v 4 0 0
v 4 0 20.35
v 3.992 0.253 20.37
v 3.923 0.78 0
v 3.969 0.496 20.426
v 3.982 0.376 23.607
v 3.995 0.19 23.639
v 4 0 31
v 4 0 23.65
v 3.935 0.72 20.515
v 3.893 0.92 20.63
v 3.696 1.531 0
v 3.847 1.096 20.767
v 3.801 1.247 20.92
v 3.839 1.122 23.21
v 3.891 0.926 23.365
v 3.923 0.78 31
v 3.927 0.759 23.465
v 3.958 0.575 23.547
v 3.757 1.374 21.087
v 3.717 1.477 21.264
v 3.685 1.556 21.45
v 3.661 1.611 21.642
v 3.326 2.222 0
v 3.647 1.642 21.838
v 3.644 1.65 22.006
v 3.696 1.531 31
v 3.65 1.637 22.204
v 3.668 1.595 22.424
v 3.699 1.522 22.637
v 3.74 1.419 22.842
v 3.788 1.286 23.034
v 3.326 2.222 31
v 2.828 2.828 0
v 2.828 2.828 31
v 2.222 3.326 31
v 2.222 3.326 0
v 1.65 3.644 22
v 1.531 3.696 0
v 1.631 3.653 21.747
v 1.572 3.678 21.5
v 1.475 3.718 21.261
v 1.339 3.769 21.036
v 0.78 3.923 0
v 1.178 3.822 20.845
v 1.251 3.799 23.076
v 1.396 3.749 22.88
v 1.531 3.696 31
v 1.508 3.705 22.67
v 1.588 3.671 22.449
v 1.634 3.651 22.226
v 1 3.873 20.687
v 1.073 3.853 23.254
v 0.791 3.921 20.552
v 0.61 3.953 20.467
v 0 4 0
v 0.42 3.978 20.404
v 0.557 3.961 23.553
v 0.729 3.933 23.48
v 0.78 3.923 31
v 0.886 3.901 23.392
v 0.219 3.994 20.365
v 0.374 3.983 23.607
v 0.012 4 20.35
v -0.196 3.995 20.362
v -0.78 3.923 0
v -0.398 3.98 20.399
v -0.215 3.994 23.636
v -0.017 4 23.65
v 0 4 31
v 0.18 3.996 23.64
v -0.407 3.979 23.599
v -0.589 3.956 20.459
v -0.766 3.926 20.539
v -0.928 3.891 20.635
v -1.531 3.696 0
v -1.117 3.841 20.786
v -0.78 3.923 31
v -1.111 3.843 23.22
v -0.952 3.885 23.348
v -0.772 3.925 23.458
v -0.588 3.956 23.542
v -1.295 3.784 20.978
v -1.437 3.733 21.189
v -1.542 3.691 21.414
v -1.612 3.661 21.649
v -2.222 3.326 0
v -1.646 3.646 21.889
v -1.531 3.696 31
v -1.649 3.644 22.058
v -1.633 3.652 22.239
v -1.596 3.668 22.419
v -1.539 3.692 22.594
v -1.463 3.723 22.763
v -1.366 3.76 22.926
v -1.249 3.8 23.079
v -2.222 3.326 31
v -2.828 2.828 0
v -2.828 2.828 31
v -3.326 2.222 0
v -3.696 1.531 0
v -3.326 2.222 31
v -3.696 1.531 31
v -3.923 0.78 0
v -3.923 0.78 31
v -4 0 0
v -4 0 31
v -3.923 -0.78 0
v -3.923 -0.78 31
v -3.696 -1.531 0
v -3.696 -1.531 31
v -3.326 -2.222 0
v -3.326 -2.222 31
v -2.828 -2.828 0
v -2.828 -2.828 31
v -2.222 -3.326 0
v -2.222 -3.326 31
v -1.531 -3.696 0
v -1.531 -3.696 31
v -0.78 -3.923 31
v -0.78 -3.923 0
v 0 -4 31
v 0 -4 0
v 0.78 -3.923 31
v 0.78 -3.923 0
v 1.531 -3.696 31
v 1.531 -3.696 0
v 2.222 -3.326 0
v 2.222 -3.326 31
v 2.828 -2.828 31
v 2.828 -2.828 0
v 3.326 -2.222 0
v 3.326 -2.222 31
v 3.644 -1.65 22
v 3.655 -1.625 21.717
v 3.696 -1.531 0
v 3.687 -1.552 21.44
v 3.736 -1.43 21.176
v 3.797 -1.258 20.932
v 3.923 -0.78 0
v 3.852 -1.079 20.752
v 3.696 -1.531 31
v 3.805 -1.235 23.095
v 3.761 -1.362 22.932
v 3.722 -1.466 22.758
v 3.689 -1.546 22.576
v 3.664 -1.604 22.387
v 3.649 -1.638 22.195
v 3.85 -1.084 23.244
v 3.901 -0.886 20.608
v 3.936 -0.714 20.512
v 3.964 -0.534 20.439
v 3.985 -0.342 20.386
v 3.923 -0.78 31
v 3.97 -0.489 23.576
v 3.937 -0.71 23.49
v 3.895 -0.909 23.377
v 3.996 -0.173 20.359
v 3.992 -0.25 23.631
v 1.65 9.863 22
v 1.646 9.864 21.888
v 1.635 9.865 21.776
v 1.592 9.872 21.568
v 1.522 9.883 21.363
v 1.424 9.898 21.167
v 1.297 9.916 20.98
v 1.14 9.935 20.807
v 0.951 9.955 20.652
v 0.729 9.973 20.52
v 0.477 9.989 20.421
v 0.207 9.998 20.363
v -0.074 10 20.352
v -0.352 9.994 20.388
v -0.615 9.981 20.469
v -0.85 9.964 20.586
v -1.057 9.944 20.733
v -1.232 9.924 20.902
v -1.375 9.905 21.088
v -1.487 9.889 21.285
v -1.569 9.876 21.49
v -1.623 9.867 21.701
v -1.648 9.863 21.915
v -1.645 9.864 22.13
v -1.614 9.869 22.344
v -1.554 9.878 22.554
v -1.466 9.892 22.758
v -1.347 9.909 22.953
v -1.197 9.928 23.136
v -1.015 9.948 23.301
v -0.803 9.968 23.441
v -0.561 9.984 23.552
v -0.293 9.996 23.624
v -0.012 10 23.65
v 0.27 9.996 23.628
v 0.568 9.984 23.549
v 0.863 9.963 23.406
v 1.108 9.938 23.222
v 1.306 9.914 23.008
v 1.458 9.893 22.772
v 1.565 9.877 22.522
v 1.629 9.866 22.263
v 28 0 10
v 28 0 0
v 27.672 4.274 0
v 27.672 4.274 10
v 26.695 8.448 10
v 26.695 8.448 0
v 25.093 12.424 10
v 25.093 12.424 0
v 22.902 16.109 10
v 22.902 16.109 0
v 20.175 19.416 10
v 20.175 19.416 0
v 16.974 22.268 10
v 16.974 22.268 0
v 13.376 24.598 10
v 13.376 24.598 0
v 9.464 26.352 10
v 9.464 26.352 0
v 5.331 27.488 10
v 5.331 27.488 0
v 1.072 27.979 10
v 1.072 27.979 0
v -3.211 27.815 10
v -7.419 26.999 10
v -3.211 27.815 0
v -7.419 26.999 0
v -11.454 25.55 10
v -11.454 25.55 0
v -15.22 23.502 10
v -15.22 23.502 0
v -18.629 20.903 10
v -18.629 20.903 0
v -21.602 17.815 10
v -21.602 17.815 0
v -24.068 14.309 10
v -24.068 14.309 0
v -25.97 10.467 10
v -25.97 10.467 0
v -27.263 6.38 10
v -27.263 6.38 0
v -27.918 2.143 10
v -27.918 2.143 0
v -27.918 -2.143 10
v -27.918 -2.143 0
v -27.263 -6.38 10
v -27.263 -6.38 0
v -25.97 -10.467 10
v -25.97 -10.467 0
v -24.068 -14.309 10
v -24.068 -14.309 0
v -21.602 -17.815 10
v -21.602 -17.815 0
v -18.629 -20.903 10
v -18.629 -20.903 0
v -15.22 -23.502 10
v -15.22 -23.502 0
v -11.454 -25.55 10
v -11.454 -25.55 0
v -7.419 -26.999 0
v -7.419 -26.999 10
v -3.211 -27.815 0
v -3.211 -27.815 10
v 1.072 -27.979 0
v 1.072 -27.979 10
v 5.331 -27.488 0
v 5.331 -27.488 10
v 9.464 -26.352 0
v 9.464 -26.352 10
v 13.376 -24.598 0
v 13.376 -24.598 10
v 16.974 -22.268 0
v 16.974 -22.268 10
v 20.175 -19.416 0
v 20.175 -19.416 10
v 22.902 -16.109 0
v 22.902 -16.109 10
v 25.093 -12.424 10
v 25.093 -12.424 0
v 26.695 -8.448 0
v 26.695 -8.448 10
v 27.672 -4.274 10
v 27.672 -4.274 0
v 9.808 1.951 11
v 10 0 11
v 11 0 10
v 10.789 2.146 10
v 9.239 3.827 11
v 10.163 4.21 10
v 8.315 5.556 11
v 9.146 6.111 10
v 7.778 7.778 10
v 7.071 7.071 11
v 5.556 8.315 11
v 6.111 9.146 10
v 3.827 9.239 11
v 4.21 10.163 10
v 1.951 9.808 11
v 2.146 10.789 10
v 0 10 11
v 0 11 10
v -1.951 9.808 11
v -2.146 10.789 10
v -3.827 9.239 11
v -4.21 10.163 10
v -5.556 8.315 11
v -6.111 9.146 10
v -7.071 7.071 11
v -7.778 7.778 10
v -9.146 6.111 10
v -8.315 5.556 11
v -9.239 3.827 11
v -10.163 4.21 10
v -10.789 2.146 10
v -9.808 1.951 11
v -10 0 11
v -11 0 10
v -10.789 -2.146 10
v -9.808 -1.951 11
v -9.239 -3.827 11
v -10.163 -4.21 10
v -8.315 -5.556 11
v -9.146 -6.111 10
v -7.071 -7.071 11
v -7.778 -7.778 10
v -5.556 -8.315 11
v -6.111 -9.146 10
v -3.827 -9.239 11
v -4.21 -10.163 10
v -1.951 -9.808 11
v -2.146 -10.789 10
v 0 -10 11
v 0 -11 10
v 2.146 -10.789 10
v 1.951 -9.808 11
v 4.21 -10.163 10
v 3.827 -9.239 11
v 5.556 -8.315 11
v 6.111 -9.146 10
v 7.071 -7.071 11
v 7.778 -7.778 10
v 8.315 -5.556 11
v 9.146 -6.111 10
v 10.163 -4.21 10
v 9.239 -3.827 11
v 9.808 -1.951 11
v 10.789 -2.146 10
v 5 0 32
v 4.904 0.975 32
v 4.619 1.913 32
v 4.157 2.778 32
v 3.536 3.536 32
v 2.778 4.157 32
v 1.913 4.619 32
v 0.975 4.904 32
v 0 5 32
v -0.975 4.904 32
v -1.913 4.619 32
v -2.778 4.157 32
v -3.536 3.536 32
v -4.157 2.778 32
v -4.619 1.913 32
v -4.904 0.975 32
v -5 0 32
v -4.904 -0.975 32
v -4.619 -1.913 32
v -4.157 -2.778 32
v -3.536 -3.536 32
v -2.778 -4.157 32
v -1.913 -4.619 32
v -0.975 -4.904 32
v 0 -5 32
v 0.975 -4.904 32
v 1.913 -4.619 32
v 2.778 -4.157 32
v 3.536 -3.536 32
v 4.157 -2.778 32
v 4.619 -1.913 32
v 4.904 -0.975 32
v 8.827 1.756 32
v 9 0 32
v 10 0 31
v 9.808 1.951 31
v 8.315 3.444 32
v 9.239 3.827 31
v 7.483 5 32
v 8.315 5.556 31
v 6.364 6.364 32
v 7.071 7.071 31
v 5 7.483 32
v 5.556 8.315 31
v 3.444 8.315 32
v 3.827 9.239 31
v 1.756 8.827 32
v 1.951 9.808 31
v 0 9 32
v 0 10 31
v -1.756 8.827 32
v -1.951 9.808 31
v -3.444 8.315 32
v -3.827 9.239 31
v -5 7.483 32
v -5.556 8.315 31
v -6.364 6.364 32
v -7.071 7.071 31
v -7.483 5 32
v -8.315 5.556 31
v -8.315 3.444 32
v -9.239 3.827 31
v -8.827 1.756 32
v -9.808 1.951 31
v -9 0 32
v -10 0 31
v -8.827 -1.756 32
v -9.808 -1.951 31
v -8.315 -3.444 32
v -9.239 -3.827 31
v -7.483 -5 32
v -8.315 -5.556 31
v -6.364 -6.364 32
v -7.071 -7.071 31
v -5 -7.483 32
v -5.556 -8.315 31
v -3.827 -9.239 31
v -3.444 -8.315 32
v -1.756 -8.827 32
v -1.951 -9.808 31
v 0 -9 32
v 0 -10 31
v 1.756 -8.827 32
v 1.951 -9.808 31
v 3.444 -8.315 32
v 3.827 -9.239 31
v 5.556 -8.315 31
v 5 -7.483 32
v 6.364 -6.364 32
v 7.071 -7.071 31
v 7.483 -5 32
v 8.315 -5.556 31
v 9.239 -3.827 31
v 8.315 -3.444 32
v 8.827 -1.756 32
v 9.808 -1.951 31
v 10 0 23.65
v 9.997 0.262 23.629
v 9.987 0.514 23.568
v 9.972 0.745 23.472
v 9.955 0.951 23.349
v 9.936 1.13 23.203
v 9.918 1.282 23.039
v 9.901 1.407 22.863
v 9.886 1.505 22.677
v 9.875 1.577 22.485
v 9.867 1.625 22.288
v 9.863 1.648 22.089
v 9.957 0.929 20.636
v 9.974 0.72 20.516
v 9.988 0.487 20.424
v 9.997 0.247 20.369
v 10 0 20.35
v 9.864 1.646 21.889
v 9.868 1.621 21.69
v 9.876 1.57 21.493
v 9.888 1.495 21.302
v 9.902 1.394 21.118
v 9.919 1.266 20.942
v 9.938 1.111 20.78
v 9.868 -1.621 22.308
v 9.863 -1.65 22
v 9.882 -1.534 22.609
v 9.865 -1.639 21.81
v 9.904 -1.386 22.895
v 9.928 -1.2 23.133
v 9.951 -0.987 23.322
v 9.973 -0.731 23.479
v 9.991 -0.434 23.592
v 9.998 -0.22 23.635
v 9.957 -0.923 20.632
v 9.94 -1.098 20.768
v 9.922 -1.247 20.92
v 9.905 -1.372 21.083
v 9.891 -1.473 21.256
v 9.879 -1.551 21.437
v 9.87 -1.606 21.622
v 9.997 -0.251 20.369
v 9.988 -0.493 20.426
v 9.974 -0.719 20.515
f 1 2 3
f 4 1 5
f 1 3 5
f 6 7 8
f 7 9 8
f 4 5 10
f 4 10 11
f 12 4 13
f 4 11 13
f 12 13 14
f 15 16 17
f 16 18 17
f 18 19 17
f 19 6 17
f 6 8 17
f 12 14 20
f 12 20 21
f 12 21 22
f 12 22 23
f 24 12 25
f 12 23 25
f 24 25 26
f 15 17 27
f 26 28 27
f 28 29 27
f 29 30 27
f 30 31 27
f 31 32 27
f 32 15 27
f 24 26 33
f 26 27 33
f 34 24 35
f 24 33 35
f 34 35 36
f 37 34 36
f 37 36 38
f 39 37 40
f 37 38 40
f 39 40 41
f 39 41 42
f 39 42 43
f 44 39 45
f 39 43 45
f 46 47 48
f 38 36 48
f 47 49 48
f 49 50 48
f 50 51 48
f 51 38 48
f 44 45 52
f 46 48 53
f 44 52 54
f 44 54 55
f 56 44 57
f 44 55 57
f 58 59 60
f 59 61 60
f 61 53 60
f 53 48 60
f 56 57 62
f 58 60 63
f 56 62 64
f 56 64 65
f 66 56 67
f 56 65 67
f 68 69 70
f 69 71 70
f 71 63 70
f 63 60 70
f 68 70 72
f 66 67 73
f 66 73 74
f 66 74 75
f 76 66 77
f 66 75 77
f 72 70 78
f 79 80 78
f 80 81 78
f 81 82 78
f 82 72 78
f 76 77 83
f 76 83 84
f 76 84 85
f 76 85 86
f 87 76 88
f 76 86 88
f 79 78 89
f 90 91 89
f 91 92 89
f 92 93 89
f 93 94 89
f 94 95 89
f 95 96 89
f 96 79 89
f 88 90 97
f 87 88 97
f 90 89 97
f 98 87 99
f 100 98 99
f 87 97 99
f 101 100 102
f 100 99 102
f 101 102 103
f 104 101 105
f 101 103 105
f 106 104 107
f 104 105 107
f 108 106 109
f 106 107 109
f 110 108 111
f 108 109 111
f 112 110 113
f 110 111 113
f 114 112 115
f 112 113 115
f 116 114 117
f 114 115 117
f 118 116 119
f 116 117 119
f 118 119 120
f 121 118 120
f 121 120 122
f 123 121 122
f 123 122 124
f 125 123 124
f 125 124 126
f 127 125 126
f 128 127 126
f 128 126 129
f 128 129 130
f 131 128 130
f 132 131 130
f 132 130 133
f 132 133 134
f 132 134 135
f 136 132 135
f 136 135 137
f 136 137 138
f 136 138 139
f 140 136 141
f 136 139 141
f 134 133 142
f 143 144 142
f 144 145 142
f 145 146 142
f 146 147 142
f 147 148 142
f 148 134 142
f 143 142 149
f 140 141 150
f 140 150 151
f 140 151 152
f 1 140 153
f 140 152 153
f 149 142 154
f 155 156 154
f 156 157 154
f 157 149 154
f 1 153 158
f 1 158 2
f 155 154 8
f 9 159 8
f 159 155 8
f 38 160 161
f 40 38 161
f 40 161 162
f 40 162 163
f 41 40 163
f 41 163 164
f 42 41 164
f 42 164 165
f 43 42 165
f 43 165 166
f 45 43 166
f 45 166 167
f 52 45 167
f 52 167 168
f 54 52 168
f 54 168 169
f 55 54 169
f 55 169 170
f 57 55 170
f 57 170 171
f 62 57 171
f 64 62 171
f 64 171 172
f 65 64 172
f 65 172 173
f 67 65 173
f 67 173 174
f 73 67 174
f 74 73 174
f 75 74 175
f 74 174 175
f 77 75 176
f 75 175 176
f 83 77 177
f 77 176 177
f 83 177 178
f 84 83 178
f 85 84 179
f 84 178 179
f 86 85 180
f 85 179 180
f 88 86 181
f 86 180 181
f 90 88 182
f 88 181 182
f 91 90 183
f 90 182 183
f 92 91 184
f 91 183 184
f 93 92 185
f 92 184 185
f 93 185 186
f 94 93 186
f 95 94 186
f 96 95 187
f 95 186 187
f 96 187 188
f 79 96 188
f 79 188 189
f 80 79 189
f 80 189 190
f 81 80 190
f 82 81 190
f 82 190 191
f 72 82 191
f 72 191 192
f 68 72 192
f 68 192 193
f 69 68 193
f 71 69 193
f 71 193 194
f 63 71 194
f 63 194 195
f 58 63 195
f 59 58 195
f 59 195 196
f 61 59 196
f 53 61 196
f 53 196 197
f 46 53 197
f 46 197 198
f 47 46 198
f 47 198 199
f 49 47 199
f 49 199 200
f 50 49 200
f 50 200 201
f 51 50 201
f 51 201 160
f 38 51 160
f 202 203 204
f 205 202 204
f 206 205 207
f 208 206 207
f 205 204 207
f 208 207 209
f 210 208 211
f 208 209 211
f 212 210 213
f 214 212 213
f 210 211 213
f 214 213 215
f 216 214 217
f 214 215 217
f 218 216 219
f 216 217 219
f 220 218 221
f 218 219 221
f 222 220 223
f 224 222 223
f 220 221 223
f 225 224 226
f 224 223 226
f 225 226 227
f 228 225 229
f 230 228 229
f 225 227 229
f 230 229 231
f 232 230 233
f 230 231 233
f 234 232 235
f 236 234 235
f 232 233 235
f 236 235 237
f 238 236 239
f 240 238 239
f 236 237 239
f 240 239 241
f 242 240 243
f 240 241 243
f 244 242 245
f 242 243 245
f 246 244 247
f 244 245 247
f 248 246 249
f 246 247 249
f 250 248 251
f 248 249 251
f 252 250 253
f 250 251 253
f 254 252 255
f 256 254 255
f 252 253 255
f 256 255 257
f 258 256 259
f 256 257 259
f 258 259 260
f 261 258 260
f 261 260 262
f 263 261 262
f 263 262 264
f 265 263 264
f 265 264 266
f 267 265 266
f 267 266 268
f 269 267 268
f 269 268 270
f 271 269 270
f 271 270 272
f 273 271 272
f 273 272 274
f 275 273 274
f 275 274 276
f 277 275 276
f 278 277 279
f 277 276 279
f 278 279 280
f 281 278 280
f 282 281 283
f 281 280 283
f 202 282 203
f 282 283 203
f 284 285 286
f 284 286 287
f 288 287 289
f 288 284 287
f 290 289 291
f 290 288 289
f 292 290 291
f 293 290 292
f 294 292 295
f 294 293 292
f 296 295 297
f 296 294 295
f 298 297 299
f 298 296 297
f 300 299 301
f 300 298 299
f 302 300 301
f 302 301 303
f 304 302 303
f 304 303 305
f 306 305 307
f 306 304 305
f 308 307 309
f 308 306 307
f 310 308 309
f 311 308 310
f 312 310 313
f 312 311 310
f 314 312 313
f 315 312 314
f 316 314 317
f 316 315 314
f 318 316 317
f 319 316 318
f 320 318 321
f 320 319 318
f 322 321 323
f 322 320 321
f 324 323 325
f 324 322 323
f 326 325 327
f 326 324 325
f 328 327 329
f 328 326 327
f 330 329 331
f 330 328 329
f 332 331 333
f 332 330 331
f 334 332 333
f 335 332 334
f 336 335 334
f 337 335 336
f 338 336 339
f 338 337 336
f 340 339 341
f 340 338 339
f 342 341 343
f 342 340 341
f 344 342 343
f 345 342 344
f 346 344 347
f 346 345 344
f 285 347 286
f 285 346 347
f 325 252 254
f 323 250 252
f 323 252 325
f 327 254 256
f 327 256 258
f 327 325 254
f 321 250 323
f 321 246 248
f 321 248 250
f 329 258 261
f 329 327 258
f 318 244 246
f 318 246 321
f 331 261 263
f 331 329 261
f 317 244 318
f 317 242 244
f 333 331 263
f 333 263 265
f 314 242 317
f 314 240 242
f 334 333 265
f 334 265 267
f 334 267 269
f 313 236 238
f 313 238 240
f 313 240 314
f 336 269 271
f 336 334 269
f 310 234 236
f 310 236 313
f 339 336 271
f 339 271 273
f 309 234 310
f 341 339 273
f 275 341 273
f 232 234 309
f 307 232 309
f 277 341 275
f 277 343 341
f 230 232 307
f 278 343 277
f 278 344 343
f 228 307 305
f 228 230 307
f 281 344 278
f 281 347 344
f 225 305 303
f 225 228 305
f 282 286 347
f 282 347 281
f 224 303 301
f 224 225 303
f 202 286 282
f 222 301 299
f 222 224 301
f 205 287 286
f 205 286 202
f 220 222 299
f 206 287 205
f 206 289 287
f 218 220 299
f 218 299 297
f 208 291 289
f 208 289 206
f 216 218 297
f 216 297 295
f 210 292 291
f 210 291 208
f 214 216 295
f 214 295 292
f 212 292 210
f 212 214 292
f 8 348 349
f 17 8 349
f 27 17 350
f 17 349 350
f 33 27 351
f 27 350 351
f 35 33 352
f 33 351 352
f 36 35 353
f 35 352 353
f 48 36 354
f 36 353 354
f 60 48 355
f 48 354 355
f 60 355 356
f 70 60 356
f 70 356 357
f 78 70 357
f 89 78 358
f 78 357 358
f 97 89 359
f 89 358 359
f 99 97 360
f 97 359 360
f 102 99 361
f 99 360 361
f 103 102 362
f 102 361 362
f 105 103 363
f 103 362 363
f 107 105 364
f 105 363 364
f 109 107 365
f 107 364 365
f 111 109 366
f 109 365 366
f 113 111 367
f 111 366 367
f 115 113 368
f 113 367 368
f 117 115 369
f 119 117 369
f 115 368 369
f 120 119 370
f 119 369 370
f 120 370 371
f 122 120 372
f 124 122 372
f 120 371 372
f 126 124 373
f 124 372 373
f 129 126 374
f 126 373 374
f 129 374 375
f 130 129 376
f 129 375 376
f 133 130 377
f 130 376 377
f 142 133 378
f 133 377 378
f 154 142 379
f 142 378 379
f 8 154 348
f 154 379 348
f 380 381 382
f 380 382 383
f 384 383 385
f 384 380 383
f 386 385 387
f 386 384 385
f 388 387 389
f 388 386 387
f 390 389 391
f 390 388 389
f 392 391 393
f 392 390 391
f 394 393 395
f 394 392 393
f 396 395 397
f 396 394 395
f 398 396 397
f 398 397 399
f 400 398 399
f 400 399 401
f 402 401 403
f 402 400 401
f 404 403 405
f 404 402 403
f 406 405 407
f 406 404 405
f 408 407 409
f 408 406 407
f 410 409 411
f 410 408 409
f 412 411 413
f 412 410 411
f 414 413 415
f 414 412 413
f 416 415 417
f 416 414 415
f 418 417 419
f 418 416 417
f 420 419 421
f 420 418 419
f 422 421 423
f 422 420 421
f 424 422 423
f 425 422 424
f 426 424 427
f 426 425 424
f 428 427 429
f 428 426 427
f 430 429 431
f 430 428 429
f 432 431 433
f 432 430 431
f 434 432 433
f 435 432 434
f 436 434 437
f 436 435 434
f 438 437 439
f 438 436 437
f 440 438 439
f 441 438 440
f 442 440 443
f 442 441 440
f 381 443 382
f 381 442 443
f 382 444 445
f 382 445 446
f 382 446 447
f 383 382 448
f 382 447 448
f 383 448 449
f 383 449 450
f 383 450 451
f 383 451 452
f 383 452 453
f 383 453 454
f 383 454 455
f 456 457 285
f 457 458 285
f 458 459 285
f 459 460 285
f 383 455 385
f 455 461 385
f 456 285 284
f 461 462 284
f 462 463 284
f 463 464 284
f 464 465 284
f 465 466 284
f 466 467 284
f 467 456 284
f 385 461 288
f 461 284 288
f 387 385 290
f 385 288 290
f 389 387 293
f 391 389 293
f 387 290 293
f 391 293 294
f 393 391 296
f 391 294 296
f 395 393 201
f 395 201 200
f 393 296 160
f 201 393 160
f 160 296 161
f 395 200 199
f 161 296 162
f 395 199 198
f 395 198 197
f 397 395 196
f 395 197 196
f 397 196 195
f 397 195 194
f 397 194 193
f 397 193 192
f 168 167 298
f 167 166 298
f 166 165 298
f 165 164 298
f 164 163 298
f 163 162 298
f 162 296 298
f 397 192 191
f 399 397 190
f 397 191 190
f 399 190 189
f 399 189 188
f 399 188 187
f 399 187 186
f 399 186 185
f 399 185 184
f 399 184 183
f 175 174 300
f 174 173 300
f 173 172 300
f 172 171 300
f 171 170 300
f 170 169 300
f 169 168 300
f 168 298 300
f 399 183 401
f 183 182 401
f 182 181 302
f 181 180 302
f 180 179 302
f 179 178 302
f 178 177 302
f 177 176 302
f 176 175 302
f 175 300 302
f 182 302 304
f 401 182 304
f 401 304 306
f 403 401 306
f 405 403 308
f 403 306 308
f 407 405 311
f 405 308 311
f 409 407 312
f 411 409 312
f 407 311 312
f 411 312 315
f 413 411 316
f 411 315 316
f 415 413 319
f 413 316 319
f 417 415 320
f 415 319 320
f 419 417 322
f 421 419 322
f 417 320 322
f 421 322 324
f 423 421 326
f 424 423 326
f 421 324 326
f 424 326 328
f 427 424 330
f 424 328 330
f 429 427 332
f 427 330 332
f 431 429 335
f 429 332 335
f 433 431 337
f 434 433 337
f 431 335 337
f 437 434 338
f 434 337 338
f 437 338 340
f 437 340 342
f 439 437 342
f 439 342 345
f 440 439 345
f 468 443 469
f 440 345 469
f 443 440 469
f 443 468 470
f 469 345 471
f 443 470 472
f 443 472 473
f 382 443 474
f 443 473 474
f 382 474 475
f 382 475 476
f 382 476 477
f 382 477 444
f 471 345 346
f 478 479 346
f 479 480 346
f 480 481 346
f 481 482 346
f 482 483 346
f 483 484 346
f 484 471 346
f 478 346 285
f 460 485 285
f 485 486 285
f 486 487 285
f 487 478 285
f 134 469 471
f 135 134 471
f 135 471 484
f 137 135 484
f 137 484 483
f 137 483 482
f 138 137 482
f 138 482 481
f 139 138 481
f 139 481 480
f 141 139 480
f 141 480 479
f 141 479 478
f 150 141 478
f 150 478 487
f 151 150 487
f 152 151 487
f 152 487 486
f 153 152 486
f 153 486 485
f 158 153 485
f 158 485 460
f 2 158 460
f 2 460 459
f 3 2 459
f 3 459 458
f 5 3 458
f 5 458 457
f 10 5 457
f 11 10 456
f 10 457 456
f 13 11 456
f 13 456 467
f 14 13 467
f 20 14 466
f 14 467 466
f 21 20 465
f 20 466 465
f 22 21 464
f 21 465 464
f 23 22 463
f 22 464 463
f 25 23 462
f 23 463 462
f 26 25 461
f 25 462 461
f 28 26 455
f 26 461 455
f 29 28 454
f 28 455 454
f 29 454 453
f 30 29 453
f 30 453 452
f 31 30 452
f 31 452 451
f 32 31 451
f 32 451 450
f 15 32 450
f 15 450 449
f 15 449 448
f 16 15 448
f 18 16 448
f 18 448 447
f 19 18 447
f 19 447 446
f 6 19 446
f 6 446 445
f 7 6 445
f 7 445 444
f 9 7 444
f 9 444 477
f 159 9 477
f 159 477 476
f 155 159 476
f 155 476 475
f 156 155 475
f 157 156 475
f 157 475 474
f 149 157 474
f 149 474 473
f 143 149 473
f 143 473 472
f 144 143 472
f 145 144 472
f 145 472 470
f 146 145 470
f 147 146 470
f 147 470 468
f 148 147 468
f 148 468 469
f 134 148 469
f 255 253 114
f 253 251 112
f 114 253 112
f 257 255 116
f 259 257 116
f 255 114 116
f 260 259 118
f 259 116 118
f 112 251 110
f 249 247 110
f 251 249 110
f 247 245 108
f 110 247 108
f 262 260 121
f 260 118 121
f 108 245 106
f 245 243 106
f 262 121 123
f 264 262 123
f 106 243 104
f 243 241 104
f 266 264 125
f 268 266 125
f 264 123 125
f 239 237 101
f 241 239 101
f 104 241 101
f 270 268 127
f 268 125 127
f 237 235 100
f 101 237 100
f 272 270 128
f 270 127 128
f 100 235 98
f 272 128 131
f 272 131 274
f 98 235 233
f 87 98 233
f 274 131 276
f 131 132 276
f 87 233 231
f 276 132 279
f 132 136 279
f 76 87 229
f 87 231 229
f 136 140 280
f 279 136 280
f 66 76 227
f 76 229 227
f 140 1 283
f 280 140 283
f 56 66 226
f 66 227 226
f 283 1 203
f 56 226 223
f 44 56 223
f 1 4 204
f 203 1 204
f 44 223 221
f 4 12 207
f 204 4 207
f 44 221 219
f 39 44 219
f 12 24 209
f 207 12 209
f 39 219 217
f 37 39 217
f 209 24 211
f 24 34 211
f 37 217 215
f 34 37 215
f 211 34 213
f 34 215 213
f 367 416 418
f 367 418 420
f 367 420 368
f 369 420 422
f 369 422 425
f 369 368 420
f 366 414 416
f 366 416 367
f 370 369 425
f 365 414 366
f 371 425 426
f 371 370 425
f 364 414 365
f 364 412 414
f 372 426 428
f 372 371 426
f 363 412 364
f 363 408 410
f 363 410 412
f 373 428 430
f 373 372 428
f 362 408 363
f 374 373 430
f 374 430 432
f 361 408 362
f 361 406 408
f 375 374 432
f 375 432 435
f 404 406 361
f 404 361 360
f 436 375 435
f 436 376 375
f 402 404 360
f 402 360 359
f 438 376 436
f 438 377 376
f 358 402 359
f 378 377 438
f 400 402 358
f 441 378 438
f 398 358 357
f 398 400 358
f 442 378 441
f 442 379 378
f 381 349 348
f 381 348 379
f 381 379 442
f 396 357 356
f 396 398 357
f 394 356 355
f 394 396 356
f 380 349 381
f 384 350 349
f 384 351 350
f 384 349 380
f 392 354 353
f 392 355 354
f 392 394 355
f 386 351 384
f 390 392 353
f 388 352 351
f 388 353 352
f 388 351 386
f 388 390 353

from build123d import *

# Parameters (mm, degrees)
SKETCH1_R              = 28
BOSS_EXTRUDE1_DEPTH    = 10
SKETCH2_R              = 10
BOSS_EXTRUDE2_DEPTH    = 22
SKETCH4_R              = 4
CUT_EXTRUDE2_DEPTH     = 51.911688245
CHAMFER2_SIZE          = 1
M4_TAPPED_HOLE1_REACH  = 54.077
M4_TAPPED_HOLE1_BORE_R = 1.65
CIRPATTERN2_COUNT      = 2
CIRPATTERN2_ANGLE      = 90


with BuildPart() as part:
    # Sketch1 → Boss-Extrude1 (new body)
    with BuildSketch(Plane.XY):
        Circle(SKETCH1_R)
    extrude(amount=BOSS_EXTRUDE1_DEPTH)

    # Sketch2 → Boss-Extrude2 (add)
    with BuildSketch(Plane.XY.offset(10)):
        Circle(SKETCH2_R)
    extrude(amount=BOSS_EXTRUDE2_DEPTH)

    # Sketch4 → Cut-Extrude2 (cut, through all)
    with BuildSketch(Plane.XY.offset(32)):
        Circle(SKETCH4_R)
    extrude(amount=-CUT_EXTRUDE2_DEPTH, mode=Mode.SUBTRACT)

    # Chamfer2
    chamfer2_edges = [part.edges().sort_by_distance(p)[0] for p in [
        (-4, 0, 32),
        (-10, 0, 10),
        (-10, 0, 32),
    ]]
    chamfer(chamfer2_edges, length=CHAMFER2_SIZE)

    # M4 Tapped Hole1 bore (on position points) → M4 Tapped Hole1 (cut, up to next)
    with BuildSketch(Plane(origin=(0, 10, 22), x_dir=(1, 0, 0), z_dir=(0, 1, 0)), mode=Mode.PRIVATE) as m4_tapped_hole1_sk1:
        Circle(M4_TAPPED_HOLE1_BORE_R)
    m4_tapped_hole1_tool1 = extrude(m4_tapped_hole1_sk1.sketch, amount=-M4_TAPPED_HOLE1_REACH, mode=Mode.PRIVATE) & part.part
    m4_tapped_hole1 = m4_tapped_hole1_tool1.solids().sort_by_distance((0, 10, 22))[0]
    add(m4_tapped_hole1, mode=Mode.SUBTRACT)

    # CirPattern2: M4 Tapped Hole1 ×2 about axis
    cirpattern2_axis = Axis((0, 0, 32), (0, 0, -1))
    for i in range(1, CIRPATTERN2_COUNT):
        add(m4_tapped_hole1.rotate(cirpattern2_axis, i * CIRPATTERN2_ANGLE / (CIRPATTERN2_COUNT - 1)), mode=Mode.SUBTRACT)


solid = part.part
